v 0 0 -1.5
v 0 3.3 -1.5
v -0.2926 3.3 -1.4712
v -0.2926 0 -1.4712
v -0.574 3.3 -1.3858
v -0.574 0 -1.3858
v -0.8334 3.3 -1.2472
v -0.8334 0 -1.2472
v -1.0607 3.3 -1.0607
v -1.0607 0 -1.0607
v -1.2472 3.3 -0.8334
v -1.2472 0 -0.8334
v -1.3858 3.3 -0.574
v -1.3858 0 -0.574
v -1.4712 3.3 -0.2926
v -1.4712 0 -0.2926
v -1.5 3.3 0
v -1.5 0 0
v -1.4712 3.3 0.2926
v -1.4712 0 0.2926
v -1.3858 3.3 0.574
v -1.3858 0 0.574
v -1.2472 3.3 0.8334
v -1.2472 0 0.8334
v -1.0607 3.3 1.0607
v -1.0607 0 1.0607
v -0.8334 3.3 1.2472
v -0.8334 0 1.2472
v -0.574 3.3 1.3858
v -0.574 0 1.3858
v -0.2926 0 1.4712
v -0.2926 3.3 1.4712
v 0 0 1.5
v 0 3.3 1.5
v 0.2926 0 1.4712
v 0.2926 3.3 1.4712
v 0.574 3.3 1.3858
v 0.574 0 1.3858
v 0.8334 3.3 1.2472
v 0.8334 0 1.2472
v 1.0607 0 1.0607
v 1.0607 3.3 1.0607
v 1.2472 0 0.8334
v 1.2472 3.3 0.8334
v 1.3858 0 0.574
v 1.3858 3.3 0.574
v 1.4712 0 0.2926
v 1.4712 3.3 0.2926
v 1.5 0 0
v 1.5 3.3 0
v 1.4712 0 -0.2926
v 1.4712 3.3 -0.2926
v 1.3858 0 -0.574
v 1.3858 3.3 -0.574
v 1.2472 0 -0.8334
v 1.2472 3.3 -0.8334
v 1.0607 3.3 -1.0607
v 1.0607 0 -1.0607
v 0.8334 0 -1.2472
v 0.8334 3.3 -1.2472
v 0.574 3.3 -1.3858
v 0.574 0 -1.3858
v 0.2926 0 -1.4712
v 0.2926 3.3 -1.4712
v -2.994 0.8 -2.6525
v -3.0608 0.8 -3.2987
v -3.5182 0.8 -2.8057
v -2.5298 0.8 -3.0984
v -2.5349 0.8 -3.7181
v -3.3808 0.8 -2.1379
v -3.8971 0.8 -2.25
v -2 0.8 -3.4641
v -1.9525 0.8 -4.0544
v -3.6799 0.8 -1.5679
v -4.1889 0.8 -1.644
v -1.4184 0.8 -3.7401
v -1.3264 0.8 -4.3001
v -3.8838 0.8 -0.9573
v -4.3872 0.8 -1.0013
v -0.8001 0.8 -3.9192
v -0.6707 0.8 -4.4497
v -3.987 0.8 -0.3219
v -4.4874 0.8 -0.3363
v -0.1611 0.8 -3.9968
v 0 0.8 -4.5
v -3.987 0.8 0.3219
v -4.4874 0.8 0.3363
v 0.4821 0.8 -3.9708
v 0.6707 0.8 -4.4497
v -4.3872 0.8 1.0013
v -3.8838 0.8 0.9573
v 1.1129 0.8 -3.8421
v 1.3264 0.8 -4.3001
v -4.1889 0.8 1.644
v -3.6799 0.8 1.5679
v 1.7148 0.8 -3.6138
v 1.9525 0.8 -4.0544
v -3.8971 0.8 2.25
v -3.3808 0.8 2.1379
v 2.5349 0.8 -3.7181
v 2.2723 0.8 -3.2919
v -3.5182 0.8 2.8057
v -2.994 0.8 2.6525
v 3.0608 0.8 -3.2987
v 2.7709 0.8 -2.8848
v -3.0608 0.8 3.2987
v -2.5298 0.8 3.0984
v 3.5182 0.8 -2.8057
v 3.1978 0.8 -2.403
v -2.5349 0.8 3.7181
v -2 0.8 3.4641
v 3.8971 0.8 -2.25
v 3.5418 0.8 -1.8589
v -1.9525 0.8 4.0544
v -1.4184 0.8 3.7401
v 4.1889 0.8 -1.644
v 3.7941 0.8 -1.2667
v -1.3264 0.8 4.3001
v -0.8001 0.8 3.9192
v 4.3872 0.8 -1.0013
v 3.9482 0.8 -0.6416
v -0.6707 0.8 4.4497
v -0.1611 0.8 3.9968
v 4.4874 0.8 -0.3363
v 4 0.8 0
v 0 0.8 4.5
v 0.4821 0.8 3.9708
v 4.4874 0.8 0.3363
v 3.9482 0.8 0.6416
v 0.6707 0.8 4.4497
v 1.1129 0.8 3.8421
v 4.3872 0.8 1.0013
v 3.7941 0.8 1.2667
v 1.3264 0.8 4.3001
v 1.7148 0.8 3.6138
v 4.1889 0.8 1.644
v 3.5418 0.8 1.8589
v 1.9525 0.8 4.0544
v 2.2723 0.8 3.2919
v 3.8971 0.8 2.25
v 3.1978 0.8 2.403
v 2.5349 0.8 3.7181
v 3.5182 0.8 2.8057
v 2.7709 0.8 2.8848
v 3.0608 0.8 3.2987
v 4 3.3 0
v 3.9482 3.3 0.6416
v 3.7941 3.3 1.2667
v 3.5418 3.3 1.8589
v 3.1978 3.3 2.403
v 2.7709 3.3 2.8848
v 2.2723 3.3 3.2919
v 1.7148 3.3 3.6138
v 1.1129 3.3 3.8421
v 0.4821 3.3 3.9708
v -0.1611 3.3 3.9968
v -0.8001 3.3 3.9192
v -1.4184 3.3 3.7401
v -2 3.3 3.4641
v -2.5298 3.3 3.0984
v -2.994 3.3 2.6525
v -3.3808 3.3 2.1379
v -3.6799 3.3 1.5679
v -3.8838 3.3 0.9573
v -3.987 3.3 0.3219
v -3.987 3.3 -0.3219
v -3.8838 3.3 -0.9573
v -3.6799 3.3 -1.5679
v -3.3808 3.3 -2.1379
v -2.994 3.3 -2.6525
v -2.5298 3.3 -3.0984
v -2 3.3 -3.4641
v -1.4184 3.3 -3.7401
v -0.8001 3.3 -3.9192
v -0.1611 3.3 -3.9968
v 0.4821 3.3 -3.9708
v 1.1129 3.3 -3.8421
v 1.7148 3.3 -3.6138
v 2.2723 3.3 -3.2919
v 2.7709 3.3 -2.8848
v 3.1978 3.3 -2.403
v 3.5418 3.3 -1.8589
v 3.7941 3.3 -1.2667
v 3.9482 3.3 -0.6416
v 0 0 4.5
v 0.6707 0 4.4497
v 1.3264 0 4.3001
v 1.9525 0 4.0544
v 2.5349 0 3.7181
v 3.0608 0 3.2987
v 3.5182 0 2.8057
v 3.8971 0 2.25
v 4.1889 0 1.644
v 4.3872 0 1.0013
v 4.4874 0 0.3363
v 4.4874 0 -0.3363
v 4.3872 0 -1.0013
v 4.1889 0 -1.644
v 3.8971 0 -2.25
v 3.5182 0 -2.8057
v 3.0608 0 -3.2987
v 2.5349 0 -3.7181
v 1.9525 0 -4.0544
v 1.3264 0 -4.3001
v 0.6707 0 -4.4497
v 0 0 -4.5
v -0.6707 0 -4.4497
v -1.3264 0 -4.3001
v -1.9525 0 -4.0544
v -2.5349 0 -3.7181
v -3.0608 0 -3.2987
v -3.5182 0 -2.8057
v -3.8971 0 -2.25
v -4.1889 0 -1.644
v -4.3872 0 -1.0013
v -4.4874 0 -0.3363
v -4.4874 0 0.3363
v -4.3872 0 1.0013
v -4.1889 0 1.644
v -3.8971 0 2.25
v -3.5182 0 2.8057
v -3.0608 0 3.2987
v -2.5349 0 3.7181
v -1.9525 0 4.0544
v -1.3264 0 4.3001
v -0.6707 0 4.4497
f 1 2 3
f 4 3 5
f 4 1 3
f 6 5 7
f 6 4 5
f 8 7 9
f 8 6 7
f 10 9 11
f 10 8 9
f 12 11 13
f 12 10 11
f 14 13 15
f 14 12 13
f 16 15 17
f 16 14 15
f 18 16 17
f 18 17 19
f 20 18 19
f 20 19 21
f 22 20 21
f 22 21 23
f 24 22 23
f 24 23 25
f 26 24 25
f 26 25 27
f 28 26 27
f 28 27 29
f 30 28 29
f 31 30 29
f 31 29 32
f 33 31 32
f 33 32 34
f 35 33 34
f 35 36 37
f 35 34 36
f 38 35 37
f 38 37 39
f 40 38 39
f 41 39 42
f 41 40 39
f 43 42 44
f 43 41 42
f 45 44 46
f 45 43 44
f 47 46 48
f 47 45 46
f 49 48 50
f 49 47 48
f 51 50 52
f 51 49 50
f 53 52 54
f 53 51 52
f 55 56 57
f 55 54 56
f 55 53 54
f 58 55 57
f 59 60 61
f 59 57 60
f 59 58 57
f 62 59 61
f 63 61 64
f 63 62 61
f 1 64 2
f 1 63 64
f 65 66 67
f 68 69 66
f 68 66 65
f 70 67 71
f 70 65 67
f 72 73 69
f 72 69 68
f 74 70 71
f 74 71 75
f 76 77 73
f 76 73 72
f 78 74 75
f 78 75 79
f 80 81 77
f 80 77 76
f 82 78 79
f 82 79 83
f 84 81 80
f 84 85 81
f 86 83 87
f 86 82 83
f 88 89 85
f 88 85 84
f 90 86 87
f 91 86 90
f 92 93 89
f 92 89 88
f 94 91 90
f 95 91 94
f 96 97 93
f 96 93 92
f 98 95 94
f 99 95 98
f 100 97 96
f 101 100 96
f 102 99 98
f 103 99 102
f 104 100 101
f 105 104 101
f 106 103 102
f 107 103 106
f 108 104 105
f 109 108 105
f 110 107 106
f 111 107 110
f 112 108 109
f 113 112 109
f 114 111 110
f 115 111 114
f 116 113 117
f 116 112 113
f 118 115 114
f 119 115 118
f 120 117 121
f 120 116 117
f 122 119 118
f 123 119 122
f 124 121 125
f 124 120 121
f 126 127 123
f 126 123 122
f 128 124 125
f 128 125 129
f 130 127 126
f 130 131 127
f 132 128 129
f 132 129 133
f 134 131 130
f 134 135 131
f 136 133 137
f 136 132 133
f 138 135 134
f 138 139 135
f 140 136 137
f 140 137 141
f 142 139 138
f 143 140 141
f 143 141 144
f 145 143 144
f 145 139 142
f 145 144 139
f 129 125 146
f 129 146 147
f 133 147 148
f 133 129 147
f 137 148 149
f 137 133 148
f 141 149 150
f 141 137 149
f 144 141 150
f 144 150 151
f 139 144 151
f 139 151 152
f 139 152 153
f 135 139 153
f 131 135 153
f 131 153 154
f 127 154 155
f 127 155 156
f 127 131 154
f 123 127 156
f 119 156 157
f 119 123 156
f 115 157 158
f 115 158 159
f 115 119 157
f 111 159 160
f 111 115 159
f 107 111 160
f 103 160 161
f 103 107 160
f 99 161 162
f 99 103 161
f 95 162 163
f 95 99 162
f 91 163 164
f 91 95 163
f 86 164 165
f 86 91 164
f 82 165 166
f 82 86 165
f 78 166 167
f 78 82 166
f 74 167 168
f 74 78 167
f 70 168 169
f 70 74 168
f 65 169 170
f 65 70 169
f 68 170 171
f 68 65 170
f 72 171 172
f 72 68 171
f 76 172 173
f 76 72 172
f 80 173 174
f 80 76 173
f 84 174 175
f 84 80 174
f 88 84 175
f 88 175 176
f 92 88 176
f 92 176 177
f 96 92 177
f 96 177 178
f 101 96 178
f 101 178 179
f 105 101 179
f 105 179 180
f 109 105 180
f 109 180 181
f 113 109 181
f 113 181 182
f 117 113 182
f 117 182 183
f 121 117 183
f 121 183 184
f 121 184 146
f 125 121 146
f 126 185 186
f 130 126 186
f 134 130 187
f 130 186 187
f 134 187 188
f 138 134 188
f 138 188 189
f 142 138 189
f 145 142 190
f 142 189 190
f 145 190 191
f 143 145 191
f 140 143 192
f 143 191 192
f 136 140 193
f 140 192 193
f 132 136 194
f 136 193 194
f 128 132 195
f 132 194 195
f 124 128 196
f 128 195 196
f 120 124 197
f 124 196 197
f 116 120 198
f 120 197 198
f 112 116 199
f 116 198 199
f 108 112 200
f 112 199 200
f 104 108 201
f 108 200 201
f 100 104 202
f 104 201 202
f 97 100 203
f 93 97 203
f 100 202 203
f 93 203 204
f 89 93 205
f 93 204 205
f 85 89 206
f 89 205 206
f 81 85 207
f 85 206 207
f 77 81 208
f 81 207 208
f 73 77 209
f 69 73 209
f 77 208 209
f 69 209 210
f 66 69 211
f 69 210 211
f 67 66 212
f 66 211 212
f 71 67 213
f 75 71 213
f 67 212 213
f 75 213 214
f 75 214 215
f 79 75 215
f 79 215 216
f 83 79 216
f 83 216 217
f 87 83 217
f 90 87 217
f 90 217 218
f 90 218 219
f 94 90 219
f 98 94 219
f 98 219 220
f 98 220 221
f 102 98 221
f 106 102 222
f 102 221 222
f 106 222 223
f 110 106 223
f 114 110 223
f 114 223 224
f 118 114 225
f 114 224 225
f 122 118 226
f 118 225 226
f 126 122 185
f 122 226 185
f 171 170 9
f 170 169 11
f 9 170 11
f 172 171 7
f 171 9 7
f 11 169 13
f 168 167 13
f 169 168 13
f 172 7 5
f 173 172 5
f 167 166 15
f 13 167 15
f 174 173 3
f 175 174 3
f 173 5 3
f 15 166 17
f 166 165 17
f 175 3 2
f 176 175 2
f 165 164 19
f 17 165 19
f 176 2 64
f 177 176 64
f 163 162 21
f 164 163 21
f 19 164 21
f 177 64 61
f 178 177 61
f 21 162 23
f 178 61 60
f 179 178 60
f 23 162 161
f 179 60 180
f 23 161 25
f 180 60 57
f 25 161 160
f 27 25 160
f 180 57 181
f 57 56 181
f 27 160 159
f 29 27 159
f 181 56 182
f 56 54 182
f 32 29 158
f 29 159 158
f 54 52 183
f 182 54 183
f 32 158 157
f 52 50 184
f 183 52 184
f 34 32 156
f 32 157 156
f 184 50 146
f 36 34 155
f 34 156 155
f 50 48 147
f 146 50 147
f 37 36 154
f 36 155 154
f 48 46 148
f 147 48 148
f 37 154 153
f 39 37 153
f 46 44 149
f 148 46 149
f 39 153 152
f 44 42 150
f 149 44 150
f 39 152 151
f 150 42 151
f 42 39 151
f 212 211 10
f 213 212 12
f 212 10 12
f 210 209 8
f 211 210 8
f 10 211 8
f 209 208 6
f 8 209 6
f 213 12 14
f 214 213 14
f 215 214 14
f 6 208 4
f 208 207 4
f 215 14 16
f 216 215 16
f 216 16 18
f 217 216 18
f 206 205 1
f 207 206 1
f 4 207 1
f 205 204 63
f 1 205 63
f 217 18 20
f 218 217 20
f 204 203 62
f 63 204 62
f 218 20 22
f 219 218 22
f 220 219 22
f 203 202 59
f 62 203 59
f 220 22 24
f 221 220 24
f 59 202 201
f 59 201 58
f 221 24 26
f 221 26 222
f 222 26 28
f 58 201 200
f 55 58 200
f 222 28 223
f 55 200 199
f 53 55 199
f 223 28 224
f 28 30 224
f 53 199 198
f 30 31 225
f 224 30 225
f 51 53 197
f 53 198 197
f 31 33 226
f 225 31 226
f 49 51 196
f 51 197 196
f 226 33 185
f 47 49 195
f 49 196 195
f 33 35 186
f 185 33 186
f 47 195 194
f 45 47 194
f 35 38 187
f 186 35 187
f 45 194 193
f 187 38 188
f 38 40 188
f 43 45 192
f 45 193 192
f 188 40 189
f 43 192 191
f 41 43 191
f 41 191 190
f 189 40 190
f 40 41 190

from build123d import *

# Parameters (mm, degrees)
SKETCH1_R           = 4.5
BOSS_EXTRUDE1_DEPTH = 0.8
SKETCH2_R           = 4
BOSS_EXTRUDE2_DEPTH = 2.5
SKETCH3_R           = 1.5
CUT_EXTRUDE1_DEPTH  = 12.5


with BuildPart() as part:
    # Sketch1 → Boss-Extrude1 (new body)
    with BuildSketch(Plane(origin=(0, 0, 0), x_dir=(1, 0, 0), z_dir=(0, 1, 0))):
        with Locations(Location((0, 0, 0), (0, 0, 270))):
            Circle(SKETCH1_R)
    extrude(amount=BOSS_EXTRUDE1_DEPTH)

    # Sketch2 → Boss-Extrude2 (add)
    with BuildSketch(Plane(origin=(0, 0.8, 0), x_dir=(-1, 0, 0), z_dir=(0, -1, 0))):
        with Locations(Location((0, 0, 0), (0, 0, 180))):
            Circle(SKETCH2_R)
    extrude(amount=-BOSS_EXTRUDE2_DEPTH)

    # Sketch3 → Cut-Extrude1 (cut)
    with BuildSketch(Plane(origin=(0, 0, 0), x_dir=(1, 0, 0), z_dir=(0, 1, 0))):
        with Locations(Location((0, 0, 0), (0, 0, 90))):
            Circle(SKETCH3_R)
    extrude(amount=CUT_EXTRUDE1_DEPTH, mode=Mode.SUBTRACT)


solid = part.part
